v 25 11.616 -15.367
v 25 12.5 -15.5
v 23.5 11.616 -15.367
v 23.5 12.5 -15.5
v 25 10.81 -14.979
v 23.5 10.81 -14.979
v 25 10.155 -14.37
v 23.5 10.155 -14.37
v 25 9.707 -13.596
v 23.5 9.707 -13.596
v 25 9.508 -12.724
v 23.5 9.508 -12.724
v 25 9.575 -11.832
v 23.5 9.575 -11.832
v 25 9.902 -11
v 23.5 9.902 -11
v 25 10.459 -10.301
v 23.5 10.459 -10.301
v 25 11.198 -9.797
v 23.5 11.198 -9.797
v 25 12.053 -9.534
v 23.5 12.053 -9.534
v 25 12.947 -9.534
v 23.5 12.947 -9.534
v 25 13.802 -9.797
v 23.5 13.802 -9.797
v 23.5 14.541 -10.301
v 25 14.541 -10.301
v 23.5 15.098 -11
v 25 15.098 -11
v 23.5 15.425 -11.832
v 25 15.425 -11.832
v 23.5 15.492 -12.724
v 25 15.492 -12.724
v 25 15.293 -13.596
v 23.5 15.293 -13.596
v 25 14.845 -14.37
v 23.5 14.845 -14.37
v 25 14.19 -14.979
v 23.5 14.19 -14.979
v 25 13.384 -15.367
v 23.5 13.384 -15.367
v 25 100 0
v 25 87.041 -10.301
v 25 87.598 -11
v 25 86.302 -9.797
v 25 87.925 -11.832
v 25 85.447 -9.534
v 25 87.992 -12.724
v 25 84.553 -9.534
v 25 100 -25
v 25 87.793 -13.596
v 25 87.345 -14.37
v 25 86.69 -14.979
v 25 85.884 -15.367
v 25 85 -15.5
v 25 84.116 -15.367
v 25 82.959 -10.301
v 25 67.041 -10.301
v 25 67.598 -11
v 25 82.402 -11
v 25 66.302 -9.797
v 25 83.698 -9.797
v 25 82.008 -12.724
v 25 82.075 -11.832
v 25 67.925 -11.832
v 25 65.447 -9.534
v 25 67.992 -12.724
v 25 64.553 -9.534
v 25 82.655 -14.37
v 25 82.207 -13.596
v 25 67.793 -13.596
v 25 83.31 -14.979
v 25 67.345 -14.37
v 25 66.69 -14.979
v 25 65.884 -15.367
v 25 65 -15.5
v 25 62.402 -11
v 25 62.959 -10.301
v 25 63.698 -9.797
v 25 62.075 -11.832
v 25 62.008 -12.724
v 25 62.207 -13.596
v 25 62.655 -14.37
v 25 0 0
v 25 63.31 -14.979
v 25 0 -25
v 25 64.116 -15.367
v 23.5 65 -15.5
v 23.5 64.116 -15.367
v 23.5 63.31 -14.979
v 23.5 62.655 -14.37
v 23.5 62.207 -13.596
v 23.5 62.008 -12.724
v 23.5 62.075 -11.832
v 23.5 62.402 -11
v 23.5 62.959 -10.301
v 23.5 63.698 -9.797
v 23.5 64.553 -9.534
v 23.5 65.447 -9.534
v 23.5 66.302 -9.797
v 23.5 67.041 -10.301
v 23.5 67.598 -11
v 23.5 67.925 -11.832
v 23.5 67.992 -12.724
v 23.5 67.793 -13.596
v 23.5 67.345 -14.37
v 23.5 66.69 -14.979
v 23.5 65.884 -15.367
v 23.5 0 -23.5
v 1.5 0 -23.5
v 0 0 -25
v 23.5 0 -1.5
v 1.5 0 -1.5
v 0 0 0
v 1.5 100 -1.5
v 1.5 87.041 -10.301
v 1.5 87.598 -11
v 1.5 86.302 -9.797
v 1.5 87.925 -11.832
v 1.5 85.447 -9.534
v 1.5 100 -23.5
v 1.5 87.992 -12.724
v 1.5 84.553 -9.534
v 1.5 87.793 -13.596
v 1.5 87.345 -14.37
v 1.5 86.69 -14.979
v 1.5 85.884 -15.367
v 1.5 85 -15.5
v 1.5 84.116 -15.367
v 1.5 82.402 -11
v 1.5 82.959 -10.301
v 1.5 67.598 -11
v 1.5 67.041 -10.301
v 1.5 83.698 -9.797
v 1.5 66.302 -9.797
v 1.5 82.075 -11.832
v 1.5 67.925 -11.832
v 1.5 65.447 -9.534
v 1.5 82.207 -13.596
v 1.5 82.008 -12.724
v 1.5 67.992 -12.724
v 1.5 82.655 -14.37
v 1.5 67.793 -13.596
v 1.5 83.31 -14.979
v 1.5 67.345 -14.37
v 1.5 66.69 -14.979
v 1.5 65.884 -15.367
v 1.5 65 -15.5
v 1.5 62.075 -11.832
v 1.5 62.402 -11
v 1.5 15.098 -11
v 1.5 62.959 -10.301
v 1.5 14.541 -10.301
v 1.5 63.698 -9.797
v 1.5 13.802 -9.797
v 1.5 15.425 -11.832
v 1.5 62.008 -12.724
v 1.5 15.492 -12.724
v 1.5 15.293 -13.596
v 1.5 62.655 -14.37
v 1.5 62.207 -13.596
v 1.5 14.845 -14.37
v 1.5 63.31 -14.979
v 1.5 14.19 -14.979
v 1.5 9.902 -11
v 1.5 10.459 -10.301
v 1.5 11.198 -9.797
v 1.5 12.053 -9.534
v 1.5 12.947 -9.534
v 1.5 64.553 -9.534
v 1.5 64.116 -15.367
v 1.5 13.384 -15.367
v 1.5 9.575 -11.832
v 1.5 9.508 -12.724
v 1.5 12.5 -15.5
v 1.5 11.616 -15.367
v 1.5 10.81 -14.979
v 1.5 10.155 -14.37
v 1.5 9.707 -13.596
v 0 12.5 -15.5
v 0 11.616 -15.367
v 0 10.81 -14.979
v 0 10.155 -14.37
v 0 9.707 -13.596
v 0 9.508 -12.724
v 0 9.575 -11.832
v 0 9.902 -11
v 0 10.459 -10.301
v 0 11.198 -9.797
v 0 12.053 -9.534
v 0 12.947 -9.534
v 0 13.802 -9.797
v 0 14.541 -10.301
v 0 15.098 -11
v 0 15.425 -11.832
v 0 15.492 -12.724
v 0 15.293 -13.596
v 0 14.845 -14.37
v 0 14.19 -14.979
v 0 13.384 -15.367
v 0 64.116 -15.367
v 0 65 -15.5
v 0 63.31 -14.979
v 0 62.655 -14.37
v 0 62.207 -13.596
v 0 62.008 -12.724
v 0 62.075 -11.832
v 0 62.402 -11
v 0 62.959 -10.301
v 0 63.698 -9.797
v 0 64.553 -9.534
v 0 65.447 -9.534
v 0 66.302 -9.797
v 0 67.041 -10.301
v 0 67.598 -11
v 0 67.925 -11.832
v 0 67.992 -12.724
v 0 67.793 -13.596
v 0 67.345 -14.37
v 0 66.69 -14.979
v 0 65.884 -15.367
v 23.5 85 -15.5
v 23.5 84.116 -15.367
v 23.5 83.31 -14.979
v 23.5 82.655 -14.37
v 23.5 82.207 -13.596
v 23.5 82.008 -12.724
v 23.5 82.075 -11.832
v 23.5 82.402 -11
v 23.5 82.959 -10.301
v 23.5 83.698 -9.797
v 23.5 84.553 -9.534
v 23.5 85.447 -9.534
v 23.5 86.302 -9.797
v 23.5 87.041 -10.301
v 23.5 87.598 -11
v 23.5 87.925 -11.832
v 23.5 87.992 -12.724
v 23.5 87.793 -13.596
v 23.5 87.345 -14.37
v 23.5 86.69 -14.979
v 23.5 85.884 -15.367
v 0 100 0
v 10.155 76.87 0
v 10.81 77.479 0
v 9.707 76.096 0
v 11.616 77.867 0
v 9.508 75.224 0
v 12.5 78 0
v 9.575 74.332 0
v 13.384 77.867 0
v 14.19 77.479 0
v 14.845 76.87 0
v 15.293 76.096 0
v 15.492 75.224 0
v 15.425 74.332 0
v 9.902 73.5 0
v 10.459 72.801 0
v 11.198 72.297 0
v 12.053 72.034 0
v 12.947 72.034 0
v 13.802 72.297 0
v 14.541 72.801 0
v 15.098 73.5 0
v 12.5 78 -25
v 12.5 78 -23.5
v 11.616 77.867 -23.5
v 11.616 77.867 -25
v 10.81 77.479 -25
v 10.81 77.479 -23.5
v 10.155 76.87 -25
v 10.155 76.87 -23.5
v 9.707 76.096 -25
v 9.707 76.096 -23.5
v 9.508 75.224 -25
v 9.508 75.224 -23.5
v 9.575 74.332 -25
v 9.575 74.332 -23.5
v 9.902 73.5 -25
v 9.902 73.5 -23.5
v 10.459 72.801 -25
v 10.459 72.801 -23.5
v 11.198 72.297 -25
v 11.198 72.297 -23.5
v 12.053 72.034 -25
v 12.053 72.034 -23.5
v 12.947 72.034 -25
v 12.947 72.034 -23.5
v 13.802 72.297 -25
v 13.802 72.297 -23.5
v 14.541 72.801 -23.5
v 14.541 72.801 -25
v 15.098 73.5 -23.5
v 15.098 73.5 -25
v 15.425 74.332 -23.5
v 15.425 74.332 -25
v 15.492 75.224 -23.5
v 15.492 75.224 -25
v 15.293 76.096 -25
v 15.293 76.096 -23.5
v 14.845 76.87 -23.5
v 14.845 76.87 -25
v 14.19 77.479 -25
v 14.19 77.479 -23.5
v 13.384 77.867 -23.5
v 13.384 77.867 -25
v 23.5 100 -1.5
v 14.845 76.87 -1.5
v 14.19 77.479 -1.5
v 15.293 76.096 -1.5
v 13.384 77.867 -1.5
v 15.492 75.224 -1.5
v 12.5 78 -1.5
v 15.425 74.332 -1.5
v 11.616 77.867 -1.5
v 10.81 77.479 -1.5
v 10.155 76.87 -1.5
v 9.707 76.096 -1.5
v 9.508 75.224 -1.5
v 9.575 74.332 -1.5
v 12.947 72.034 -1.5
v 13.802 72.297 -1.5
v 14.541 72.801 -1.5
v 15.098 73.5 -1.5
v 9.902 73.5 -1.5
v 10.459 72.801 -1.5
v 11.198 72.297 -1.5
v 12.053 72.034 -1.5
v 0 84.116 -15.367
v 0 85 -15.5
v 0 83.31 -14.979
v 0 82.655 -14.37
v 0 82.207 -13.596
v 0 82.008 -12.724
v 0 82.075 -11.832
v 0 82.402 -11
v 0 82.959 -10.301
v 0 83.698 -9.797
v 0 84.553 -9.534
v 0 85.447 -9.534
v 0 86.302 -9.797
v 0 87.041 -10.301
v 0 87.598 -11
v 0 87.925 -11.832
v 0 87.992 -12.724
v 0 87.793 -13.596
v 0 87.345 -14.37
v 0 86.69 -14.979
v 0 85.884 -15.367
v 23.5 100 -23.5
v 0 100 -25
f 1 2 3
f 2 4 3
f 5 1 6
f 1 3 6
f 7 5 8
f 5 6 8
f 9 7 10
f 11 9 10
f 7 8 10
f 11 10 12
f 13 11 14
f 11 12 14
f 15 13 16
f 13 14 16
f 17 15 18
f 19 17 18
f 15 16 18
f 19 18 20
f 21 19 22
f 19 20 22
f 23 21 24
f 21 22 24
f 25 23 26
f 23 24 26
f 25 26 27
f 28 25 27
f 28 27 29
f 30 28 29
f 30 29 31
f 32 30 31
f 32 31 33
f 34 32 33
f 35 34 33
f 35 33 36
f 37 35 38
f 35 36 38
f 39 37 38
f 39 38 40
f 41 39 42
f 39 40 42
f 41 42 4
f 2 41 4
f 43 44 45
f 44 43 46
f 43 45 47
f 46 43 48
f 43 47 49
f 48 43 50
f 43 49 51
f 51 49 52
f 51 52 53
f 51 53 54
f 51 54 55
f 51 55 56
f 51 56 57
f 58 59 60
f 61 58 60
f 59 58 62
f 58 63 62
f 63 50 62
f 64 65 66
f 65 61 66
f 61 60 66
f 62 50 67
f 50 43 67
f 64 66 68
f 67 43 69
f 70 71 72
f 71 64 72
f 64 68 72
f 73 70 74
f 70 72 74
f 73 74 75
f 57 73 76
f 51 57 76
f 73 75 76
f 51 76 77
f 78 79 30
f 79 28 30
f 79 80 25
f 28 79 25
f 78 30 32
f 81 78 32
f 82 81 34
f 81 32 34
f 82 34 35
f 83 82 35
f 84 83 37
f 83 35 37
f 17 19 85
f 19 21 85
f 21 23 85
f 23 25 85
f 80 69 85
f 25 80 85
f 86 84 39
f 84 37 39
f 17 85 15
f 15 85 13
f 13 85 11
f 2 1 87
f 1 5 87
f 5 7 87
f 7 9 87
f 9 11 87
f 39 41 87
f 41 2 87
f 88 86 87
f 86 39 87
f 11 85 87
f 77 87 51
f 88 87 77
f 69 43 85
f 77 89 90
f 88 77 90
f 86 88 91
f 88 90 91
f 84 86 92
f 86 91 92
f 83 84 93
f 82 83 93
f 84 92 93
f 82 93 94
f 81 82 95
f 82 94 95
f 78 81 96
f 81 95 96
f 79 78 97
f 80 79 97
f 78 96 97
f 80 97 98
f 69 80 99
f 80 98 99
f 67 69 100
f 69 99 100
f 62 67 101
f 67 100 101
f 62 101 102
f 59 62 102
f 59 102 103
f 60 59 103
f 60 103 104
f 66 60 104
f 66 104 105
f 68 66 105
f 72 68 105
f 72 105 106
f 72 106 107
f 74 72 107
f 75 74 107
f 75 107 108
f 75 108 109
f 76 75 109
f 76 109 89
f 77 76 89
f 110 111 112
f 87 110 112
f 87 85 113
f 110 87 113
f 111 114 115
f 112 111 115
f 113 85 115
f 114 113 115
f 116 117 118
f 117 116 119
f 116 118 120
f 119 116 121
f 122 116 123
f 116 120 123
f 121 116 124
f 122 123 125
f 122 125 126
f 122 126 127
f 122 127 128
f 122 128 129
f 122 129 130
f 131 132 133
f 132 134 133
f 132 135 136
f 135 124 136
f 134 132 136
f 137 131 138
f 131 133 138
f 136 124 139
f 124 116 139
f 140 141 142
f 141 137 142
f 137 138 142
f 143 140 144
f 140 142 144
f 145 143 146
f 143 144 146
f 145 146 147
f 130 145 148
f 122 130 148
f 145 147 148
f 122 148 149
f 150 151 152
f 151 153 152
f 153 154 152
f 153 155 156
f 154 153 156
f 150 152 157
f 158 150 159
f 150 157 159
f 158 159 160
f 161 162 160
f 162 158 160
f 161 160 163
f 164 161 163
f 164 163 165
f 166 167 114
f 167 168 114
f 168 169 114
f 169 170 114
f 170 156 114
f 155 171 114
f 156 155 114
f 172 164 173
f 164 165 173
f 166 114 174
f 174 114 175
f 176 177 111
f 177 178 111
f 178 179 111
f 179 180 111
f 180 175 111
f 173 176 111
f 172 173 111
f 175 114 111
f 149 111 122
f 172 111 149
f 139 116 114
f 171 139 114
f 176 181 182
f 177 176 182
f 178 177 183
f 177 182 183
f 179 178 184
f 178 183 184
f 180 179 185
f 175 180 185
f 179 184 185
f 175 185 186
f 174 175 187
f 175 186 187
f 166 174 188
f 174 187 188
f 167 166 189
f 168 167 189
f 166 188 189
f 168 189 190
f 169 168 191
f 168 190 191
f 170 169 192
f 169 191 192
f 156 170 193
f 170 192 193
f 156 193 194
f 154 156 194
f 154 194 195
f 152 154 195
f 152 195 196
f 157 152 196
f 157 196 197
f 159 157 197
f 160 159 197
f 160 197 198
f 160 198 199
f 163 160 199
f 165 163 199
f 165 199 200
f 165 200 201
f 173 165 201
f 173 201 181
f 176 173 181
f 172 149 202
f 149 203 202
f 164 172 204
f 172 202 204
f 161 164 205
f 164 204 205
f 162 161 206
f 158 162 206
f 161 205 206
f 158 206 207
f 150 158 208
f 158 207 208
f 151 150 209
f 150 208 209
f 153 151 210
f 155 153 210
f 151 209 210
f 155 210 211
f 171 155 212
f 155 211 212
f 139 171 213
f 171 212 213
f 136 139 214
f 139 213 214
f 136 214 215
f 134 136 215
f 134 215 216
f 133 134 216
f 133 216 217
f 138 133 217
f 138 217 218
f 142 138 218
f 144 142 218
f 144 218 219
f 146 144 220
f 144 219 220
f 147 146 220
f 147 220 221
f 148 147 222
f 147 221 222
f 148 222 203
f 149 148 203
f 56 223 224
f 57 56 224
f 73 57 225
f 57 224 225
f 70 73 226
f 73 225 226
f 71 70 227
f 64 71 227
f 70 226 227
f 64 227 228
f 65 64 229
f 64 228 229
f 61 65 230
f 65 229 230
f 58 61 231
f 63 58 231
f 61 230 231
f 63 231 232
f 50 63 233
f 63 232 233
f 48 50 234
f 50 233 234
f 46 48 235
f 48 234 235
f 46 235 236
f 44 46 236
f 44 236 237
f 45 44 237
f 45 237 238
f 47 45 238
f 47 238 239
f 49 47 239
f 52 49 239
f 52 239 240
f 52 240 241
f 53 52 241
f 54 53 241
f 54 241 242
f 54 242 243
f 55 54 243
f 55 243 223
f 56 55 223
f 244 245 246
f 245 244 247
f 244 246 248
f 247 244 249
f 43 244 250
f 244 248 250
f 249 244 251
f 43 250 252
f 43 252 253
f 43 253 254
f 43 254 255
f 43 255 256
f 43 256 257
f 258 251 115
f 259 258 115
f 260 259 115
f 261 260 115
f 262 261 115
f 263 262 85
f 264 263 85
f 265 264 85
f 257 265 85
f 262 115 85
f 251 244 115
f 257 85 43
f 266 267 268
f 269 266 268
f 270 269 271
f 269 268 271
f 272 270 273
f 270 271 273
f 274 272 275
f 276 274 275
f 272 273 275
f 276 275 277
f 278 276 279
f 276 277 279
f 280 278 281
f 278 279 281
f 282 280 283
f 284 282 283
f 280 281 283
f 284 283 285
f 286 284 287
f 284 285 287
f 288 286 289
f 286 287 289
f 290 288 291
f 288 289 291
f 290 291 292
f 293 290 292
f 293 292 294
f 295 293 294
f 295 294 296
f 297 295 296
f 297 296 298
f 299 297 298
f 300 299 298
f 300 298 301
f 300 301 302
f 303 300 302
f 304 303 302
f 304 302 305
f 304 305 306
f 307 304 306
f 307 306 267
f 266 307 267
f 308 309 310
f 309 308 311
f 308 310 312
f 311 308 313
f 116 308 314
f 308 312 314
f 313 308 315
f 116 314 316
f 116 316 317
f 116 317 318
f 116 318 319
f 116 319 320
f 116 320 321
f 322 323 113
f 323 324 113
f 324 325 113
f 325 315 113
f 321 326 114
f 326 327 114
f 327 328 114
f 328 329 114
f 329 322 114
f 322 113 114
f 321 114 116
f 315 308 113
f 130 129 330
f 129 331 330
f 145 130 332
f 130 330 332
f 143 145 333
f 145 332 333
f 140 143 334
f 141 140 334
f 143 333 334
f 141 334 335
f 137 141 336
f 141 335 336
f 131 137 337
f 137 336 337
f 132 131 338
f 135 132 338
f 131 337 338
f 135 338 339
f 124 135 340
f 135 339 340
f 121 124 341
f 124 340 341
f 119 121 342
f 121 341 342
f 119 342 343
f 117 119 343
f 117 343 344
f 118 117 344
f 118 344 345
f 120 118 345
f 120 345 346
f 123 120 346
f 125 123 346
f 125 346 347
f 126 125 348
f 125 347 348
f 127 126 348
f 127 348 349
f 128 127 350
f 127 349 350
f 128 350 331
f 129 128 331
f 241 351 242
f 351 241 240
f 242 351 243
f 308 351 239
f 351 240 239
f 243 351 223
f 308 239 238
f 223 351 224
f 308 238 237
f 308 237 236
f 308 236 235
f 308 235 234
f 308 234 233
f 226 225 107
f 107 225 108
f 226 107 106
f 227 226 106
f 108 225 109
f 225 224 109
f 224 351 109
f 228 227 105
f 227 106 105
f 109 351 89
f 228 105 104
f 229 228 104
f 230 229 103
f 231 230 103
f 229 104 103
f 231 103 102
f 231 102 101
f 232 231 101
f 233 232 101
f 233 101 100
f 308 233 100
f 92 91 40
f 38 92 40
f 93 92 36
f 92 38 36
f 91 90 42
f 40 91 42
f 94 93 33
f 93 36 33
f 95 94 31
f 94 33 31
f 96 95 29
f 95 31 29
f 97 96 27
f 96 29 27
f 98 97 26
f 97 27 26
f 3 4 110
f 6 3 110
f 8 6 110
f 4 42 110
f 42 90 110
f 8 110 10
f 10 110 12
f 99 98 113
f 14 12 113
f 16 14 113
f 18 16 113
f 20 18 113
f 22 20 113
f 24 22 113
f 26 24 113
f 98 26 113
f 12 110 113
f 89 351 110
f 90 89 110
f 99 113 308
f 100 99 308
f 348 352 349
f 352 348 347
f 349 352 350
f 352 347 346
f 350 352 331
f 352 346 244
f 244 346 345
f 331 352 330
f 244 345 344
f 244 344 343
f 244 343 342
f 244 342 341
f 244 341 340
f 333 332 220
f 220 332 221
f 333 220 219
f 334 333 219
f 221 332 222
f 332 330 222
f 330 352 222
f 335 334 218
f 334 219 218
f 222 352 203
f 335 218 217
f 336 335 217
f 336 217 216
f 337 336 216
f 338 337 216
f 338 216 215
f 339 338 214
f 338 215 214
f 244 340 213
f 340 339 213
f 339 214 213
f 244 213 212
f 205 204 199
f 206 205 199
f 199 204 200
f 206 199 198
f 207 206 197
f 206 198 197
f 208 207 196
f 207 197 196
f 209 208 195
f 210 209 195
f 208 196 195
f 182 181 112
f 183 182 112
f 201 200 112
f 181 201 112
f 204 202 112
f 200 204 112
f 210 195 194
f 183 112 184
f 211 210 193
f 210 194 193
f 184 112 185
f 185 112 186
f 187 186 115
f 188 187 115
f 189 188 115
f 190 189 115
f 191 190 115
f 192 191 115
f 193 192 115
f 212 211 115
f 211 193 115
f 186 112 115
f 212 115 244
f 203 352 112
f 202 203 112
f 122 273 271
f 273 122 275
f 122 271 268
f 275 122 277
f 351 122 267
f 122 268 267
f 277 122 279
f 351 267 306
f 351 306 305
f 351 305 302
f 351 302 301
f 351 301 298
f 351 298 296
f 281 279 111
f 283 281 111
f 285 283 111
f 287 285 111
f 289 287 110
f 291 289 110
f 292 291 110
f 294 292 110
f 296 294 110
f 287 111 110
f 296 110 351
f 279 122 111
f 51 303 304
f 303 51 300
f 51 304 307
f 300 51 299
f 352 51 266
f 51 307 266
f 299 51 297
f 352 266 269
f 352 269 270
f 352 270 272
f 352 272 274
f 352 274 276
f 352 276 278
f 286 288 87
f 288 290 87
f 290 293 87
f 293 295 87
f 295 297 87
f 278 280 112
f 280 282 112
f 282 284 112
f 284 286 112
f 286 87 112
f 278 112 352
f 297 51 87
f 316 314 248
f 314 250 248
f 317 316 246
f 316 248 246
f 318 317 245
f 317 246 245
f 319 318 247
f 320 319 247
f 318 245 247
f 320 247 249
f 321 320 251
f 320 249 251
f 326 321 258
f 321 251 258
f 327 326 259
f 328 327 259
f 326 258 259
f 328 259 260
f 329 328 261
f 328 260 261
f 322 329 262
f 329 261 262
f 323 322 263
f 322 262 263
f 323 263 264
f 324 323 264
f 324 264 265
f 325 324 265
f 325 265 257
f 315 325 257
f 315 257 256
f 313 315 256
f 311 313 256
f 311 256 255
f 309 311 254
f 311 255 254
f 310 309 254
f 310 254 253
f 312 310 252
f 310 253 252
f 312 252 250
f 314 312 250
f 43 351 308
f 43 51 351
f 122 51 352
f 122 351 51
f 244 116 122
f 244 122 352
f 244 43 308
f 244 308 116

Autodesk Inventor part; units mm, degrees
ref_plane "YZ Plane" through (0, 0, 0) normal (1, 0, 0) x (0, 1, 0)
ref_plane "XZ Plane" through (0, 0, 0) normal (0, 1, 0) x (-1, 0, 0)
ref_plane "XY Plane" through (0, 0, 0) normal (0, 0, 1) x (1, 0, 0)
sketch "Sketch1" plane through (0, 0, 0) normal (0, 1, 0) x (-1, 0, 0)
  line L0 (0, 0) -> (-25, 0)
  line L1 (-25, 0) -> (-25, -25)
  line L2 (-25, -25) -> (0, -25)
  line L3 (0, -25) -> (0, 0)
  line L4 (-23.5, -23.5) -> (-23.5, -1.5)
  line L5 (-23.5, -1.5) -> (-1.5, -1.5)
  line L6 (-1.5, -1.5) -> (-1.5, -23.5)
  line L7 (-1.5, -23.5) -> (-23.5, -23.5)
  dimension "d0" = 25
  dimension "d1" = 25
  dimension "d2" = 1.5
extrude "Extrusion1" add sketch "Sketch1" along normal blind 100
sketch "Sketch2" plane through (25, 0, 0) normal (1, 0, 0) x (0, 0, -1)
  line L0 (0, 100) -> (25, 100) projected
  point P0 (0, 0)
  point P1 (12.5, 85)
  point P2 (12.5, 65)
  point P3 (12.5, 12.5)
  dimension "d5" = 35
  dimension "d6" = 15
  dimension "d7" = 12.5
  dimension "d15" = 12.5
hole "Hole1" at (25, 85, -12.5) at (25, 65, -12.5) at (25, 12.5, -12.5) direction (-1, 0, 0) diameter 6 end through all
sketch "Sketch3" plane through (25, 0, -25) normal (0, 0, -1) x (-1, 0, 0)
  line L0 (0, 100) -> (25, 100) projected
  point P0 (25, 0)
  point P1 (12.5, 75)
  dimension "d16" = 25
  dimension "d17" = 12.5
hole "Hole2" at (12.5, 75, -25) direction (0, 0, 1) diameter 6 end through all
properties part number "Side Bar Mount"
